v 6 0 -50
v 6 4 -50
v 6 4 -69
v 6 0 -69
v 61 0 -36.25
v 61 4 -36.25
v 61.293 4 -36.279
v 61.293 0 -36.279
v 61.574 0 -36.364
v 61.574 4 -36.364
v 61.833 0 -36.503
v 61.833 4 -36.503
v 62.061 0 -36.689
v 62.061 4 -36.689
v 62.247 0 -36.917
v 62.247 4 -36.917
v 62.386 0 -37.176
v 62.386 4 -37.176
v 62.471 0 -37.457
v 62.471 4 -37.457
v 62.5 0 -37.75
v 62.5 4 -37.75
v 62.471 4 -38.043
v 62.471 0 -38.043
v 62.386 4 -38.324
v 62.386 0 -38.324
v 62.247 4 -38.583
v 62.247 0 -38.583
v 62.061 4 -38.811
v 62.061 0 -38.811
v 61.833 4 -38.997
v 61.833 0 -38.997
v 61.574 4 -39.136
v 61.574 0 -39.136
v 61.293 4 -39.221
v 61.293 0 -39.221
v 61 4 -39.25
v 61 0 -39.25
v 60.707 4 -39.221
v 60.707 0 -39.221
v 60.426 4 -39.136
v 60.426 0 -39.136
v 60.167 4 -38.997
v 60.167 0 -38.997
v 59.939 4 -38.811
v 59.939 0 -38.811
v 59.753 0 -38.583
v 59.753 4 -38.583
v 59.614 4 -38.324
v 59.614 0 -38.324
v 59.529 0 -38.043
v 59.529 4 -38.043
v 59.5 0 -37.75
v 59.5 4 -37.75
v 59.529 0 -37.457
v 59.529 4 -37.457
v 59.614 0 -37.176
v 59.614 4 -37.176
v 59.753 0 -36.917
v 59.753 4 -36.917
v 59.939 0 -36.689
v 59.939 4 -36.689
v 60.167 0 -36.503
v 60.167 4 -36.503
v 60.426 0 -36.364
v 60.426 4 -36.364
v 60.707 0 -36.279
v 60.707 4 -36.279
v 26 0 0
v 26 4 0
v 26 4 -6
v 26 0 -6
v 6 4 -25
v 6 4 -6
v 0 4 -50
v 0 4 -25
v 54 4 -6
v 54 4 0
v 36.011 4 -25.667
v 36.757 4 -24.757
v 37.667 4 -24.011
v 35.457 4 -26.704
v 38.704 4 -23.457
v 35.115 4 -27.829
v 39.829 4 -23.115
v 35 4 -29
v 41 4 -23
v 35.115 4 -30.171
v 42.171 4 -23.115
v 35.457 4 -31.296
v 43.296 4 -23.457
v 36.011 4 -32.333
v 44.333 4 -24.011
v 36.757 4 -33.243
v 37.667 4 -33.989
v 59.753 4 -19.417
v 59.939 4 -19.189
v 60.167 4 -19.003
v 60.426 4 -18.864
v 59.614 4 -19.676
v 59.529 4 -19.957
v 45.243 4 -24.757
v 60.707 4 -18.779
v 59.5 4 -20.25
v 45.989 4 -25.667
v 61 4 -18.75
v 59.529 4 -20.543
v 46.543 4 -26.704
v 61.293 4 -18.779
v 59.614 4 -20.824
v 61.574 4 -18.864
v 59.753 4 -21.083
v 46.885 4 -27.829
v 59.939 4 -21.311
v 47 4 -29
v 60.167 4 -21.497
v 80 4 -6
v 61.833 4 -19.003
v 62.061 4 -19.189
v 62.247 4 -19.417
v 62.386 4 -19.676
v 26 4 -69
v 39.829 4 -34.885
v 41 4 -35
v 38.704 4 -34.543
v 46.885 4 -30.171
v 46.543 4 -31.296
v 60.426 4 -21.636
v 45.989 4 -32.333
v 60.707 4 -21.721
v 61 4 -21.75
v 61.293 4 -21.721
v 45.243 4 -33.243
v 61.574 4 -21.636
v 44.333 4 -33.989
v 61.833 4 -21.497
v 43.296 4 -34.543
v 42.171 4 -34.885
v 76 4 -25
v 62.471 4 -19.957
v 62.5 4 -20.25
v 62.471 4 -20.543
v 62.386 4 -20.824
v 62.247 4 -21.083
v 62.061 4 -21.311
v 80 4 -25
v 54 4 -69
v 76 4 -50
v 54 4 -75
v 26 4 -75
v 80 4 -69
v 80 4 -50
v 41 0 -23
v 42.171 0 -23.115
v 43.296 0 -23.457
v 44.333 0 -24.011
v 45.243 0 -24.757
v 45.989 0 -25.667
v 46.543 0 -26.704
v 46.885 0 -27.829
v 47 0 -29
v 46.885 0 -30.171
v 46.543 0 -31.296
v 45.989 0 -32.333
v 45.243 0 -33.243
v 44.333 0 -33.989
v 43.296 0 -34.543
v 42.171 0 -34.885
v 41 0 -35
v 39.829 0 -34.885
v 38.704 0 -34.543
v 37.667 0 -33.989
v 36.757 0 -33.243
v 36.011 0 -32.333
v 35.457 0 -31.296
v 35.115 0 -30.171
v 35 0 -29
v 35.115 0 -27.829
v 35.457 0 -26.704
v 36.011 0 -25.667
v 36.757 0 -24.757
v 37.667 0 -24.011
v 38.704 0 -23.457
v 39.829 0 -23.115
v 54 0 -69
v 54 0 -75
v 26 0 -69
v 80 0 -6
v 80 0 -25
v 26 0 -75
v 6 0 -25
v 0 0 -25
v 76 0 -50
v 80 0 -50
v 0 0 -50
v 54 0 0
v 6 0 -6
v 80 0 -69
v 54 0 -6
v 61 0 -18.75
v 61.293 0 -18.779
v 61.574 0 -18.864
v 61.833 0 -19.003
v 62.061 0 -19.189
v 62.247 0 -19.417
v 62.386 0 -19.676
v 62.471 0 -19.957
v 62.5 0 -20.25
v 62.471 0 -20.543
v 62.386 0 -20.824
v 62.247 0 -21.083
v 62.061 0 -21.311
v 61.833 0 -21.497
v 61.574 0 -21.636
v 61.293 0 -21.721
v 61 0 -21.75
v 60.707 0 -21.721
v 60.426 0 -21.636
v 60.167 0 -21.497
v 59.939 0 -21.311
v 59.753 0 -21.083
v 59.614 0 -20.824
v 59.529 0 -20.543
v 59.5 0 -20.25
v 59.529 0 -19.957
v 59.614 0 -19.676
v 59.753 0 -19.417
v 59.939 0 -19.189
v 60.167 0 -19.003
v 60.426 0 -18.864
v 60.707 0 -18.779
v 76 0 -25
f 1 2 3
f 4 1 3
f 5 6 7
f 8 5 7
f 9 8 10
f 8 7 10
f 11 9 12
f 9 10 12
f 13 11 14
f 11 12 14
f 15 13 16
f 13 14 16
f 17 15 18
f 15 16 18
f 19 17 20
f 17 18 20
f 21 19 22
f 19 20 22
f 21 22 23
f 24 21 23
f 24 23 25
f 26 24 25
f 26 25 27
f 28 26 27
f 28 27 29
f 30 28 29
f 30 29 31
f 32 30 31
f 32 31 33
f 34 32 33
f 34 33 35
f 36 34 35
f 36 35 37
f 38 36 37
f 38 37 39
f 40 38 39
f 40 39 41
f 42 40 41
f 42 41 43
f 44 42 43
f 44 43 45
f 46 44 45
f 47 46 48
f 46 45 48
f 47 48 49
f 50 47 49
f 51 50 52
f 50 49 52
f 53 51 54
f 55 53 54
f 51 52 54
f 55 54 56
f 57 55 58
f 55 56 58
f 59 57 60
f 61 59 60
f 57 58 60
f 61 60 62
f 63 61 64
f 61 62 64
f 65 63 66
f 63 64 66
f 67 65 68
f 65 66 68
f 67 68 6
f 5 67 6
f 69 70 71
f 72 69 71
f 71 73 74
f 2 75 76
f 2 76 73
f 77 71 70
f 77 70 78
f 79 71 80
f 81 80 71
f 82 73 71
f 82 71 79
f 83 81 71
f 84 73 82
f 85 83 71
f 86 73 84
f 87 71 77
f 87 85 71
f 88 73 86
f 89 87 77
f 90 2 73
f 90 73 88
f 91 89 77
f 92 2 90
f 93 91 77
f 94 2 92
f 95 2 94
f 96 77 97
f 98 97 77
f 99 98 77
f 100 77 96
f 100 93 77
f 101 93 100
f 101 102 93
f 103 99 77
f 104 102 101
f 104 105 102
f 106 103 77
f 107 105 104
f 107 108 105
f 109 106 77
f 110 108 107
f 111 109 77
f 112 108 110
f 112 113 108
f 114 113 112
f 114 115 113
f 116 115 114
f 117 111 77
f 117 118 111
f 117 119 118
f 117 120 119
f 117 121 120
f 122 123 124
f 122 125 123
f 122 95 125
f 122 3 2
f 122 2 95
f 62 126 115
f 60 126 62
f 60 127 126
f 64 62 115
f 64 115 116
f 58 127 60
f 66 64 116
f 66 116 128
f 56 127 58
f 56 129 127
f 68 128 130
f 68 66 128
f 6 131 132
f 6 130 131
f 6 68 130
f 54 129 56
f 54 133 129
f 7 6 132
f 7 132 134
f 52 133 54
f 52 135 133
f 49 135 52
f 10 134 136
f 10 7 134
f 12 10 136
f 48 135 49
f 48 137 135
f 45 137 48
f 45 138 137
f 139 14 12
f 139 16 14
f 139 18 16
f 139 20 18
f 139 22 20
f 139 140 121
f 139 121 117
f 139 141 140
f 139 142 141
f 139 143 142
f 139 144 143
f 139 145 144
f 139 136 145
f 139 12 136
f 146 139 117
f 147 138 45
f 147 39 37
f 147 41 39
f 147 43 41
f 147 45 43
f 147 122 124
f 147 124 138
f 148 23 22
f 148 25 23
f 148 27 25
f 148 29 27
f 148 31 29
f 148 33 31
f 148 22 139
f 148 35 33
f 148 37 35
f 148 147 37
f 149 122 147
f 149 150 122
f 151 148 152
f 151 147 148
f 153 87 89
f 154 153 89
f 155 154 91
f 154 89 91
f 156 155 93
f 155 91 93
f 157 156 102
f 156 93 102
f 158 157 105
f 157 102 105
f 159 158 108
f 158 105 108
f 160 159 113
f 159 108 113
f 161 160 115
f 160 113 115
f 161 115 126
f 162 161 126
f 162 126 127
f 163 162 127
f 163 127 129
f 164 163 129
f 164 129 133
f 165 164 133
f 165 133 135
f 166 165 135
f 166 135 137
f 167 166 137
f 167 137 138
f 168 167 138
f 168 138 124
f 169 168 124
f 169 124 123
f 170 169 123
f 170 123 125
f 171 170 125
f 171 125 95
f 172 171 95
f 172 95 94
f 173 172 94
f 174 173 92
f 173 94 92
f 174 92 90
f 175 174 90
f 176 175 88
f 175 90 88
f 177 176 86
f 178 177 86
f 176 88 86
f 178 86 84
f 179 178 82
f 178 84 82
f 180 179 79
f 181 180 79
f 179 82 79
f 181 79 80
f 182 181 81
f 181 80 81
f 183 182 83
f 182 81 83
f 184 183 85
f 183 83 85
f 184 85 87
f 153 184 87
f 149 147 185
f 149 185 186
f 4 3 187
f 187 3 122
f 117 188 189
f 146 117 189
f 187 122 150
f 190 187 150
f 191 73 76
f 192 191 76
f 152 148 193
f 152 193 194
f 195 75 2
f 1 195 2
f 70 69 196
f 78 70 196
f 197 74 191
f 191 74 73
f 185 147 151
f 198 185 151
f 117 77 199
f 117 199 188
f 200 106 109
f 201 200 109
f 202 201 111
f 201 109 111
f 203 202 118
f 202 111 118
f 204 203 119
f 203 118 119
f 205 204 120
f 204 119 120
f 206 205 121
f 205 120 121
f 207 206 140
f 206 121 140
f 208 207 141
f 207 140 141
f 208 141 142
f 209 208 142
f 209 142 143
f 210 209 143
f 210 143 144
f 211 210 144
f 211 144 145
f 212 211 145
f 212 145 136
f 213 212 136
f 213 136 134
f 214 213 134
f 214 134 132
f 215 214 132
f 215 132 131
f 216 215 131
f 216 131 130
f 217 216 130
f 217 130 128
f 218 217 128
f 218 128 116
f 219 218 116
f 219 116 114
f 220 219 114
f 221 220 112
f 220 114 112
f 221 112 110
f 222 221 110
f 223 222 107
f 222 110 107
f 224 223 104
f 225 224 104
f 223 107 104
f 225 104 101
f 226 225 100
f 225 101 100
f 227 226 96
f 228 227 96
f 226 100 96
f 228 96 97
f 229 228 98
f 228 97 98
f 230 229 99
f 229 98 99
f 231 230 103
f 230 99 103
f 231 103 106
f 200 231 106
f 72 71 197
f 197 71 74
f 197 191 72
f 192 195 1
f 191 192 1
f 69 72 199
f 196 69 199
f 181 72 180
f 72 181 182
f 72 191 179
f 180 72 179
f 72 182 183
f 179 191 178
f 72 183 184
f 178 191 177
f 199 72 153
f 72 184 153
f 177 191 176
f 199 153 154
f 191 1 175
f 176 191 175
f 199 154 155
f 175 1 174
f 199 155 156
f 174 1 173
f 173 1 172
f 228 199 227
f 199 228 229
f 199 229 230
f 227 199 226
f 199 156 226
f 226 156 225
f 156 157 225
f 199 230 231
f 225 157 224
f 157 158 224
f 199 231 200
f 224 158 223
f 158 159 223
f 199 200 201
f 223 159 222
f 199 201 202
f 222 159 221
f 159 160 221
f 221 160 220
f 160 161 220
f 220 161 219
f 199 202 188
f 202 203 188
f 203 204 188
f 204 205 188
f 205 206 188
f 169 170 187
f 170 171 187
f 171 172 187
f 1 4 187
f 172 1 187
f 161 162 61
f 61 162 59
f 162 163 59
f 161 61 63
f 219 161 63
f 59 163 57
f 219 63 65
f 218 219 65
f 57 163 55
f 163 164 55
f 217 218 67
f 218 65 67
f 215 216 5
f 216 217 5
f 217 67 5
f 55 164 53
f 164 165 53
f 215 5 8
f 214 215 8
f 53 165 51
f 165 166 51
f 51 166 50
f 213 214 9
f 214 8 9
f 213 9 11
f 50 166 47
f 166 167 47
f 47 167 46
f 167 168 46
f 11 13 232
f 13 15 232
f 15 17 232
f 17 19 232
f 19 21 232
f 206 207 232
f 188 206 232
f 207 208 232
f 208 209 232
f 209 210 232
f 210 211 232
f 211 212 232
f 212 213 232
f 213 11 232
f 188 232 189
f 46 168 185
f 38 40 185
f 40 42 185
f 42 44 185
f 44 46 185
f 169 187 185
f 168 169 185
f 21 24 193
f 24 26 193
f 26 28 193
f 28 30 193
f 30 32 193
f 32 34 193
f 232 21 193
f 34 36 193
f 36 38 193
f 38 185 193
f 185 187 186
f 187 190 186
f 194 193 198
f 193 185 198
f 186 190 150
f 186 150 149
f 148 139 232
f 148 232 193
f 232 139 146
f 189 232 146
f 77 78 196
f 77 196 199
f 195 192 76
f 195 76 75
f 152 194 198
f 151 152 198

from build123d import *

# Parameters (mm, degrees)
SKETCH1_W           = 80
SKETCH1_H           = 75
BOSS_EXTRUDE1_DEPTH = 4
SKETCH2_R           = 6
SKETCH2_R_2         = 1.5
CUT_EXTRUDE1_DEPTH  = 110.731490467
SKETCH3_W           = 26
SKETCH3_H           = 6
SKETCH3_W_2         = 4
SKETCH3_H_2         = 25
CUT_EXTRUDE2_DEPTH  = 110.731490467


with BuildPart() as part:
    # Sketch1 → Boss-Extrude1 (new body)
    with BuildSketch(Plane(origin=(0, 0, 0), x_dir=(1, 0, 0), z_dir=(0, 1, 0))):
        with Locations((40, 37.5)):
            Rectangle(SKETCH1_W, SKETCH1_H)
    extrude(amount=BOSS_EXTRUDE1_DEPTH)

    # Sketch2 → Cut-Extrude1 (cut, through all)
    with BuildSketch(Plane(origin=(0, 4, 0), x_dir=(1, 0, 0), z_dir=(0, 1, 0))):
        with Locations(Location((41, 29, 0), (0, 0, 270))):
            Circle(SKETCH2_R)
        with Locations(Location((61, 37.75, 0), (0, 0, 270))):
            Circle(SKETCH2_R_2)
        with Locations(Location((61, 20.25, 0), (0, 0, 270))):
            Circle(SKETCH2_R_2)
    extrude(amount=-CUT_EXTRUDE1_DEPTH, mode=Mode.SUBTRACT)

    # Sketch3 → Cut-Extrude2 (cut, through all)
    with BuildSketch(Plane(origin=(0, 4, 0), x_dir=(1, 0, 0), z_dir=(0, 1, 0))):
        with Locations((67, 3)):
            Rectangle(SKETCH3_W, SKETCH3_H)
        with Locations((78, 37.5)):
            Rectangle(SKETCH3_W_2, SKETCH3_H_2)
        with Locations((67, 72)):
            Rectangle(SKETCH3_W, SKETCH3_H)
        Polygon((0, 75), (0, 50), (6, 50), (6, 69), (26, 69), (26, 75), align=None)
        Polygon((6, 25), (0, 25), (0, 0), (26, 0), (26, 6), (6, 6), align=None)
    extrude(amount=-CUT_EXTRUDE2_DEPTH, mode=Mode.SUBTRACT)


solid = part.part
